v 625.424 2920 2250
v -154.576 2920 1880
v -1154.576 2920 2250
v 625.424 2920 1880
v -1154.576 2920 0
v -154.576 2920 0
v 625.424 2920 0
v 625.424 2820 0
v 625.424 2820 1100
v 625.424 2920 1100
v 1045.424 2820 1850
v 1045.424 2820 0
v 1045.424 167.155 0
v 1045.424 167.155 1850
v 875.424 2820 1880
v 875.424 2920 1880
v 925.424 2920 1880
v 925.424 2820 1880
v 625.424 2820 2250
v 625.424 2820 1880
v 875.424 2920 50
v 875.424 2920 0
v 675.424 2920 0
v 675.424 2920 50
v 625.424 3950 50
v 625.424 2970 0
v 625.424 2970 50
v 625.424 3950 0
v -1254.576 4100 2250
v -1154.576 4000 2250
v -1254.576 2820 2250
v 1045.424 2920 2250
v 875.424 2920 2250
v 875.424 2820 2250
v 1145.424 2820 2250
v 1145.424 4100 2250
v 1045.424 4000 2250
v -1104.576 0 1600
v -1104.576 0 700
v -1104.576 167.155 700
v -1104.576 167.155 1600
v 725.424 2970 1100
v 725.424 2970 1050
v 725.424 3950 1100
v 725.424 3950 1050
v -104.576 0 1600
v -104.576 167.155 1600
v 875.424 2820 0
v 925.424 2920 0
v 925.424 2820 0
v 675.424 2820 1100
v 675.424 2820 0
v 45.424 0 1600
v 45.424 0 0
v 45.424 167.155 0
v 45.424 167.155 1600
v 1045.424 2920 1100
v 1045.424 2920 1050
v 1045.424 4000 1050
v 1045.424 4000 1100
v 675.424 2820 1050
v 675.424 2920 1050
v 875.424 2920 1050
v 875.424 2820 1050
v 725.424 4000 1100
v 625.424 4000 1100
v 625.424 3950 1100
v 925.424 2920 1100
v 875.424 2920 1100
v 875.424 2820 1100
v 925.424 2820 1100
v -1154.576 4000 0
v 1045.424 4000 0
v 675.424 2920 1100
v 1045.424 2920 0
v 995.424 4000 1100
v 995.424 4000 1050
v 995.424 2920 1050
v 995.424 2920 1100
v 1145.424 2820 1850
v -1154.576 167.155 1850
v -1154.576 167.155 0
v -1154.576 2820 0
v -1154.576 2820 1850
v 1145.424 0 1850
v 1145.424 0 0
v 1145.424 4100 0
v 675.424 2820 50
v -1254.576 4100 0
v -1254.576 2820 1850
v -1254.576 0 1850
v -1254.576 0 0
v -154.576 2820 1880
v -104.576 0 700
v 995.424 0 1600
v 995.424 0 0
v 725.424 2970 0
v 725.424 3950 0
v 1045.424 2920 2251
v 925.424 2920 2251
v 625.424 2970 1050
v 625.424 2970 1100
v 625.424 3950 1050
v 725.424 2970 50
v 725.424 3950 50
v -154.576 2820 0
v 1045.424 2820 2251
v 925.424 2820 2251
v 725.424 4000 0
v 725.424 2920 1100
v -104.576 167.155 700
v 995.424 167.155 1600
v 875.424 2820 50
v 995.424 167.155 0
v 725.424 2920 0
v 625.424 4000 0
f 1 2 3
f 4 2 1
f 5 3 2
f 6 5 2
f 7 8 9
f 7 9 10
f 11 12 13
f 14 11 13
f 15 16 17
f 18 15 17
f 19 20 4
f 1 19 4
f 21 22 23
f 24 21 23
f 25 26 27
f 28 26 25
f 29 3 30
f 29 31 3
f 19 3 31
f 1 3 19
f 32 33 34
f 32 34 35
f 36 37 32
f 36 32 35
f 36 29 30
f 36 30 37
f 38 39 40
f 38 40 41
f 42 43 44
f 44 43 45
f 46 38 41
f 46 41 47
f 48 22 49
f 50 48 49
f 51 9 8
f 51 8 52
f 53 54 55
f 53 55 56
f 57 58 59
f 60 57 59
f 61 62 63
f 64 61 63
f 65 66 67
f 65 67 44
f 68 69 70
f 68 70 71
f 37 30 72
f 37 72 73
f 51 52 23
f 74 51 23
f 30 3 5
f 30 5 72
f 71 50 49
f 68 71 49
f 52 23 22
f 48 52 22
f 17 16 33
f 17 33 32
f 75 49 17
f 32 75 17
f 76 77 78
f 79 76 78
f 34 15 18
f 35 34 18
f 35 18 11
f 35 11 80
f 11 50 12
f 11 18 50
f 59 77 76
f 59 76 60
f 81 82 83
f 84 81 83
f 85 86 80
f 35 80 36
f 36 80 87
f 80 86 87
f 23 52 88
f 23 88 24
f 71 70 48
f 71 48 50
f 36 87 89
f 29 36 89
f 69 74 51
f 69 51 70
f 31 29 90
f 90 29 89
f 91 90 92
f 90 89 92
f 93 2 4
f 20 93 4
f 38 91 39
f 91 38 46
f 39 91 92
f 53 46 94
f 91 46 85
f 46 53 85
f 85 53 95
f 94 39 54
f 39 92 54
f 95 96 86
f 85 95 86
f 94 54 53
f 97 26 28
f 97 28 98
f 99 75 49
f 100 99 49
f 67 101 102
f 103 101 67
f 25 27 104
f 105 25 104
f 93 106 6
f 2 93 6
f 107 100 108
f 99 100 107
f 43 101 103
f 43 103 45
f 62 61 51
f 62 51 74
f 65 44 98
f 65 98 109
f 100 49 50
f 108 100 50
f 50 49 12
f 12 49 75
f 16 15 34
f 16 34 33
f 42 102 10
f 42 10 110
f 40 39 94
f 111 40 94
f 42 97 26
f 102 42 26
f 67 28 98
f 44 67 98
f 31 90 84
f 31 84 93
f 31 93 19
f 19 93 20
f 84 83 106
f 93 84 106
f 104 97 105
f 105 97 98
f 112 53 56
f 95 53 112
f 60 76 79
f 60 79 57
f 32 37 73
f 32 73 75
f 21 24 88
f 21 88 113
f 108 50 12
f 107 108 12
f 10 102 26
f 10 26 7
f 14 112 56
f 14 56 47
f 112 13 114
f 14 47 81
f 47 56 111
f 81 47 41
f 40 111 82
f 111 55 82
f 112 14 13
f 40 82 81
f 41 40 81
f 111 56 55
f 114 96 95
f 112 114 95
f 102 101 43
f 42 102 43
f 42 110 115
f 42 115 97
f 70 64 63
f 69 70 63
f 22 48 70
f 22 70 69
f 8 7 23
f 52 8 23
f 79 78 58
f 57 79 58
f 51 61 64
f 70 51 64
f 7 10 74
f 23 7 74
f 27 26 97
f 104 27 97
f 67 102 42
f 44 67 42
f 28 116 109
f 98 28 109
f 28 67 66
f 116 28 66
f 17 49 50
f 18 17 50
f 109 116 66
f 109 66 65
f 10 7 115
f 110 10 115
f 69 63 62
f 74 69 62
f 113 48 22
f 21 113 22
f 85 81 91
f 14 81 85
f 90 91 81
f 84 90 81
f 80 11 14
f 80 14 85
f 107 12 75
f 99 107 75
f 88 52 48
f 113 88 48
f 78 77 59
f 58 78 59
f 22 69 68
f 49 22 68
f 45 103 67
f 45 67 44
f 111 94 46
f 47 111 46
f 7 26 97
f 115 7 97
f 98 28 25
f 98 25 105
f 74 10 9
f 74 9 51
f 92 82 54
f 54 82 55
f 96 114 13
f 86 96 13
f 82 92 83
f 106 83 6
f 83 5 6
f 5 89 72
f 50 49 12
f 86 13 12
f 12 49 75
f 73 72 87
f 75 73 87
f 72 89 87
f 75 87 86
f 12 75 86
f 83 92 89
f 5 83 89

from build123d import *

# Parameters (mm, degrees)
F0_W      = 1000
F0_H      = 100
F1_DEPTH  = 2250
F2_START  = 1880
F0_W_2    = 50
F0_W_3    = 780
F2_DEPTH  = 370
F3_START  = 1850
F3_DEPTH  = 400
F4_W      = 1000
F4_H      = 900
F4_W_2    = 950
F4_H_2    = 1600
F5_DEPTH  = 167.155430442
F0_W_4    = 150
F6_DEPTH  = 50
F7_DEPTH  = 2251
F0_W_5    = 100
F0_H_2    = 50
F8_DEPTH  = 1100
F0_H_3    = 980
F9_DEPTH  = 50
F10_START = 1050
F10_DEPTH = 50
F11_START = 1050
F11_DEPTH = 50
F12_START = 1050
F12_DEPTH = 50
F13_DEPTH = 1100
F14_DEPTH = 1100


with BuildPart() as f1:
    # F0 (on Top) → F1 (new body)
    with BuildSketch(Plane.XY):
        Polygon((-1154.5758843422, 167.155430442), (-1154.5758843422, 2820), (-1254.5758843422, 2820), (-1254.5758843422, 0), (1145.4241156578, 0), (1145.4241156578, 2820), (1045.4241156578, 2820), (1045.4241156578, 167.155430442), align=None)
        Polygon((-1154.5758843422, 2920), (-1154.5758843422, 4000), (625.4241156578, 4000), (725.4241156578, 4000), (727.4350166321, 4000), (995.4241156578, 4000), (1045.4241156578, 4000), (1045.4241156578, 3900), (1045.4241156578, 2920), (1045.4241156578, 2820), (1145.4241156578, 2820), (1145.4241156578, 4100), (-1254.5758843422, 4100), (-1254.5758843422, 2820), (-1154.5758843422, 2820), align=None)
        with Locations((-654.5758843422, 2870)):
            Rectangle(F0_W, F0_H)
        Polygon((925.4241156578, 2820), (1045.4241156578, 2820), (1045.4241156578, 2920), (995.4241156578, 2920), (925.4241156578, 2920), align=None)
    extrude(amount=F1_DEPTH)

    # F0 (on Top) → F2 (join)
    with BuildSketch(Plane.XY.offset(F2_START)):
        with Locations((900.4241156578, 2870)):
            Rectangle(F0_W_2, F0_H)
        with Locations((235.4241156578, 2870)):
            Rectangle(F0_W_3, F0_H)
    extrude(amount=F2_DEPTH)

    # F0 (on Top) → F3 (cut)
    with BuildSketch(Plane.XY.offset(F3_START)):
        Polygon((-1154.5758843422, 167.155430442), (-1154.5758843422, 2820), (-1254.5758843422, 2820), (-1254.5758843422, 0), (1145.4241156578, 0), (1145.4241156578, 2820), (1045.4241156578, 2820), (1045.4241156578, 167.155430442), align=None)
    extrude(amount=F3_DEPTH, mode=Mode.SUBTRACT)

    # F4 (on face) → F5 (cut, through all)
    with BuildSketch(Plane.XZ):
        with Locations((-604.5758843422, 1150)):
            Rectangle(F4_W, F4_H)
        with Locations((520.4241156578, 800)):
            Rectangle(F4_W_2, F4_H_2)
    extrude(amount=-F5_DEPTH, mode=Mode.SUBTRACT)


with BuildPart() as f6:
    # F0 (on Top) → F6 (new body)
    with BuildSketch(Plane.XY):
        with Locations((700.4241156578, 2870)):
            Rectangle(F0_W_2, F0_H)
        with Locations((800.4241156578, 2870)):
            Rectangle(F0_W_4, F0_H)
    extrude(amount=F6_DEPTH)


with BuildPart() as f7:
    # F0 (on Top) → F7 (new body)
    with BuildSketch(Plane.XY):
        Polygon((925.4241156578, 2820), (1045.4241156578, 2820), (1045.4241156578, 2920), (995.4241156578, 2920), (925.4241156578, 2920), align=None)
    extrude(amount=F7_DEPTH)


with BuildPart() as f8:
    # F0 (on Top) → F8 (new body)
    with BuildSketch(Plane.XY):
        with Locations((675.4241156578, 3975)):
            Rectangle(F0_W_5, F0_H_2)
    extrude(amount=F8_DEPTH)


with BuildPart() as f9:
    # F0 (on Top) → F9 (new body)
    with BuildSketch(Plane.XY):
        with Locations((675.4241156578, 3460)):
            Rectangle(F0_W_5, F0_H_3)
    extrude(amount=F9_DEPTH)


with BuildPart() as f10:
    # F0 (on Top) → F10 (new body)
    with BuildSketch(Plane.XY.offset(F10_START)):
        with Locations((675.4241156578, 3460)):
            Rectangle(F0_W_5, F0_H_3)
    extrude(amount=F10_DEPTH)


with BuildPart() as f11:
    # F0 (on Top) → F11 (new body)
    with BuildSketch(Plane.XY.offset(F11_START)):
        with Locations((700.4241156578, 2870)):
            Rectangle(F0_W_2, F0_H)
        with Locations((800.4241156578, 2870)):
            Rectangle(F0_W_4, F0_H)
    extrude(amount=F11_DEPTH)


with BuildPart() as f12:
    # F0 (on Top) → F12 (new body)
    with BuildSketch(Plane.XY.offset(F12_START)):
        with Locations((1020.4241156578, 3950)):
            Rectangle(F0_W_2, F0_H)
        with Locations((1020.4241156578, 3410)):
            Rectangle(F0_W_2, F0_H_3)
    extrude(amount=F12_DEPTH)


with BuildPart() as f13:
    # F0 (on Top) → F13 (new body, through all)
    with BuildSketch(Plane.XY):
        with Locations((650.4241156578, 2870)):
            Rectangle(F0_W_2, F0_H)
    extrude(amount=F13_DEPTH)


with BuildPart() as f13b:
    # F0 (on Top) → F13, piece 2 (new body, through all)
    with BuildSketch(Plane.XY):
        with Locations((900.4241156578, 2870)):
            Rectangle(F0_W_2, F0_H)
    extrude(amount=F13_DEPTH)


with BuildPart() as f14:
    # F0 (on Top) → F14 (new body, through all)
    with BuildSketch(Plane.XY):
        Polygon((725.4241156578, 2970), (625.4241156578, 2970), (625.4241156578, 2920), (675.4241156578, 2920), (725.4241156578, 2920), align=None)
    extrude(amount=F14_DEPTH)


solid = Compound([f1.part, f6.part, f7.part, f8.part, f9.part, f10.part, f11.part, f12.part, f13.part, f13b.part, f14.part])
